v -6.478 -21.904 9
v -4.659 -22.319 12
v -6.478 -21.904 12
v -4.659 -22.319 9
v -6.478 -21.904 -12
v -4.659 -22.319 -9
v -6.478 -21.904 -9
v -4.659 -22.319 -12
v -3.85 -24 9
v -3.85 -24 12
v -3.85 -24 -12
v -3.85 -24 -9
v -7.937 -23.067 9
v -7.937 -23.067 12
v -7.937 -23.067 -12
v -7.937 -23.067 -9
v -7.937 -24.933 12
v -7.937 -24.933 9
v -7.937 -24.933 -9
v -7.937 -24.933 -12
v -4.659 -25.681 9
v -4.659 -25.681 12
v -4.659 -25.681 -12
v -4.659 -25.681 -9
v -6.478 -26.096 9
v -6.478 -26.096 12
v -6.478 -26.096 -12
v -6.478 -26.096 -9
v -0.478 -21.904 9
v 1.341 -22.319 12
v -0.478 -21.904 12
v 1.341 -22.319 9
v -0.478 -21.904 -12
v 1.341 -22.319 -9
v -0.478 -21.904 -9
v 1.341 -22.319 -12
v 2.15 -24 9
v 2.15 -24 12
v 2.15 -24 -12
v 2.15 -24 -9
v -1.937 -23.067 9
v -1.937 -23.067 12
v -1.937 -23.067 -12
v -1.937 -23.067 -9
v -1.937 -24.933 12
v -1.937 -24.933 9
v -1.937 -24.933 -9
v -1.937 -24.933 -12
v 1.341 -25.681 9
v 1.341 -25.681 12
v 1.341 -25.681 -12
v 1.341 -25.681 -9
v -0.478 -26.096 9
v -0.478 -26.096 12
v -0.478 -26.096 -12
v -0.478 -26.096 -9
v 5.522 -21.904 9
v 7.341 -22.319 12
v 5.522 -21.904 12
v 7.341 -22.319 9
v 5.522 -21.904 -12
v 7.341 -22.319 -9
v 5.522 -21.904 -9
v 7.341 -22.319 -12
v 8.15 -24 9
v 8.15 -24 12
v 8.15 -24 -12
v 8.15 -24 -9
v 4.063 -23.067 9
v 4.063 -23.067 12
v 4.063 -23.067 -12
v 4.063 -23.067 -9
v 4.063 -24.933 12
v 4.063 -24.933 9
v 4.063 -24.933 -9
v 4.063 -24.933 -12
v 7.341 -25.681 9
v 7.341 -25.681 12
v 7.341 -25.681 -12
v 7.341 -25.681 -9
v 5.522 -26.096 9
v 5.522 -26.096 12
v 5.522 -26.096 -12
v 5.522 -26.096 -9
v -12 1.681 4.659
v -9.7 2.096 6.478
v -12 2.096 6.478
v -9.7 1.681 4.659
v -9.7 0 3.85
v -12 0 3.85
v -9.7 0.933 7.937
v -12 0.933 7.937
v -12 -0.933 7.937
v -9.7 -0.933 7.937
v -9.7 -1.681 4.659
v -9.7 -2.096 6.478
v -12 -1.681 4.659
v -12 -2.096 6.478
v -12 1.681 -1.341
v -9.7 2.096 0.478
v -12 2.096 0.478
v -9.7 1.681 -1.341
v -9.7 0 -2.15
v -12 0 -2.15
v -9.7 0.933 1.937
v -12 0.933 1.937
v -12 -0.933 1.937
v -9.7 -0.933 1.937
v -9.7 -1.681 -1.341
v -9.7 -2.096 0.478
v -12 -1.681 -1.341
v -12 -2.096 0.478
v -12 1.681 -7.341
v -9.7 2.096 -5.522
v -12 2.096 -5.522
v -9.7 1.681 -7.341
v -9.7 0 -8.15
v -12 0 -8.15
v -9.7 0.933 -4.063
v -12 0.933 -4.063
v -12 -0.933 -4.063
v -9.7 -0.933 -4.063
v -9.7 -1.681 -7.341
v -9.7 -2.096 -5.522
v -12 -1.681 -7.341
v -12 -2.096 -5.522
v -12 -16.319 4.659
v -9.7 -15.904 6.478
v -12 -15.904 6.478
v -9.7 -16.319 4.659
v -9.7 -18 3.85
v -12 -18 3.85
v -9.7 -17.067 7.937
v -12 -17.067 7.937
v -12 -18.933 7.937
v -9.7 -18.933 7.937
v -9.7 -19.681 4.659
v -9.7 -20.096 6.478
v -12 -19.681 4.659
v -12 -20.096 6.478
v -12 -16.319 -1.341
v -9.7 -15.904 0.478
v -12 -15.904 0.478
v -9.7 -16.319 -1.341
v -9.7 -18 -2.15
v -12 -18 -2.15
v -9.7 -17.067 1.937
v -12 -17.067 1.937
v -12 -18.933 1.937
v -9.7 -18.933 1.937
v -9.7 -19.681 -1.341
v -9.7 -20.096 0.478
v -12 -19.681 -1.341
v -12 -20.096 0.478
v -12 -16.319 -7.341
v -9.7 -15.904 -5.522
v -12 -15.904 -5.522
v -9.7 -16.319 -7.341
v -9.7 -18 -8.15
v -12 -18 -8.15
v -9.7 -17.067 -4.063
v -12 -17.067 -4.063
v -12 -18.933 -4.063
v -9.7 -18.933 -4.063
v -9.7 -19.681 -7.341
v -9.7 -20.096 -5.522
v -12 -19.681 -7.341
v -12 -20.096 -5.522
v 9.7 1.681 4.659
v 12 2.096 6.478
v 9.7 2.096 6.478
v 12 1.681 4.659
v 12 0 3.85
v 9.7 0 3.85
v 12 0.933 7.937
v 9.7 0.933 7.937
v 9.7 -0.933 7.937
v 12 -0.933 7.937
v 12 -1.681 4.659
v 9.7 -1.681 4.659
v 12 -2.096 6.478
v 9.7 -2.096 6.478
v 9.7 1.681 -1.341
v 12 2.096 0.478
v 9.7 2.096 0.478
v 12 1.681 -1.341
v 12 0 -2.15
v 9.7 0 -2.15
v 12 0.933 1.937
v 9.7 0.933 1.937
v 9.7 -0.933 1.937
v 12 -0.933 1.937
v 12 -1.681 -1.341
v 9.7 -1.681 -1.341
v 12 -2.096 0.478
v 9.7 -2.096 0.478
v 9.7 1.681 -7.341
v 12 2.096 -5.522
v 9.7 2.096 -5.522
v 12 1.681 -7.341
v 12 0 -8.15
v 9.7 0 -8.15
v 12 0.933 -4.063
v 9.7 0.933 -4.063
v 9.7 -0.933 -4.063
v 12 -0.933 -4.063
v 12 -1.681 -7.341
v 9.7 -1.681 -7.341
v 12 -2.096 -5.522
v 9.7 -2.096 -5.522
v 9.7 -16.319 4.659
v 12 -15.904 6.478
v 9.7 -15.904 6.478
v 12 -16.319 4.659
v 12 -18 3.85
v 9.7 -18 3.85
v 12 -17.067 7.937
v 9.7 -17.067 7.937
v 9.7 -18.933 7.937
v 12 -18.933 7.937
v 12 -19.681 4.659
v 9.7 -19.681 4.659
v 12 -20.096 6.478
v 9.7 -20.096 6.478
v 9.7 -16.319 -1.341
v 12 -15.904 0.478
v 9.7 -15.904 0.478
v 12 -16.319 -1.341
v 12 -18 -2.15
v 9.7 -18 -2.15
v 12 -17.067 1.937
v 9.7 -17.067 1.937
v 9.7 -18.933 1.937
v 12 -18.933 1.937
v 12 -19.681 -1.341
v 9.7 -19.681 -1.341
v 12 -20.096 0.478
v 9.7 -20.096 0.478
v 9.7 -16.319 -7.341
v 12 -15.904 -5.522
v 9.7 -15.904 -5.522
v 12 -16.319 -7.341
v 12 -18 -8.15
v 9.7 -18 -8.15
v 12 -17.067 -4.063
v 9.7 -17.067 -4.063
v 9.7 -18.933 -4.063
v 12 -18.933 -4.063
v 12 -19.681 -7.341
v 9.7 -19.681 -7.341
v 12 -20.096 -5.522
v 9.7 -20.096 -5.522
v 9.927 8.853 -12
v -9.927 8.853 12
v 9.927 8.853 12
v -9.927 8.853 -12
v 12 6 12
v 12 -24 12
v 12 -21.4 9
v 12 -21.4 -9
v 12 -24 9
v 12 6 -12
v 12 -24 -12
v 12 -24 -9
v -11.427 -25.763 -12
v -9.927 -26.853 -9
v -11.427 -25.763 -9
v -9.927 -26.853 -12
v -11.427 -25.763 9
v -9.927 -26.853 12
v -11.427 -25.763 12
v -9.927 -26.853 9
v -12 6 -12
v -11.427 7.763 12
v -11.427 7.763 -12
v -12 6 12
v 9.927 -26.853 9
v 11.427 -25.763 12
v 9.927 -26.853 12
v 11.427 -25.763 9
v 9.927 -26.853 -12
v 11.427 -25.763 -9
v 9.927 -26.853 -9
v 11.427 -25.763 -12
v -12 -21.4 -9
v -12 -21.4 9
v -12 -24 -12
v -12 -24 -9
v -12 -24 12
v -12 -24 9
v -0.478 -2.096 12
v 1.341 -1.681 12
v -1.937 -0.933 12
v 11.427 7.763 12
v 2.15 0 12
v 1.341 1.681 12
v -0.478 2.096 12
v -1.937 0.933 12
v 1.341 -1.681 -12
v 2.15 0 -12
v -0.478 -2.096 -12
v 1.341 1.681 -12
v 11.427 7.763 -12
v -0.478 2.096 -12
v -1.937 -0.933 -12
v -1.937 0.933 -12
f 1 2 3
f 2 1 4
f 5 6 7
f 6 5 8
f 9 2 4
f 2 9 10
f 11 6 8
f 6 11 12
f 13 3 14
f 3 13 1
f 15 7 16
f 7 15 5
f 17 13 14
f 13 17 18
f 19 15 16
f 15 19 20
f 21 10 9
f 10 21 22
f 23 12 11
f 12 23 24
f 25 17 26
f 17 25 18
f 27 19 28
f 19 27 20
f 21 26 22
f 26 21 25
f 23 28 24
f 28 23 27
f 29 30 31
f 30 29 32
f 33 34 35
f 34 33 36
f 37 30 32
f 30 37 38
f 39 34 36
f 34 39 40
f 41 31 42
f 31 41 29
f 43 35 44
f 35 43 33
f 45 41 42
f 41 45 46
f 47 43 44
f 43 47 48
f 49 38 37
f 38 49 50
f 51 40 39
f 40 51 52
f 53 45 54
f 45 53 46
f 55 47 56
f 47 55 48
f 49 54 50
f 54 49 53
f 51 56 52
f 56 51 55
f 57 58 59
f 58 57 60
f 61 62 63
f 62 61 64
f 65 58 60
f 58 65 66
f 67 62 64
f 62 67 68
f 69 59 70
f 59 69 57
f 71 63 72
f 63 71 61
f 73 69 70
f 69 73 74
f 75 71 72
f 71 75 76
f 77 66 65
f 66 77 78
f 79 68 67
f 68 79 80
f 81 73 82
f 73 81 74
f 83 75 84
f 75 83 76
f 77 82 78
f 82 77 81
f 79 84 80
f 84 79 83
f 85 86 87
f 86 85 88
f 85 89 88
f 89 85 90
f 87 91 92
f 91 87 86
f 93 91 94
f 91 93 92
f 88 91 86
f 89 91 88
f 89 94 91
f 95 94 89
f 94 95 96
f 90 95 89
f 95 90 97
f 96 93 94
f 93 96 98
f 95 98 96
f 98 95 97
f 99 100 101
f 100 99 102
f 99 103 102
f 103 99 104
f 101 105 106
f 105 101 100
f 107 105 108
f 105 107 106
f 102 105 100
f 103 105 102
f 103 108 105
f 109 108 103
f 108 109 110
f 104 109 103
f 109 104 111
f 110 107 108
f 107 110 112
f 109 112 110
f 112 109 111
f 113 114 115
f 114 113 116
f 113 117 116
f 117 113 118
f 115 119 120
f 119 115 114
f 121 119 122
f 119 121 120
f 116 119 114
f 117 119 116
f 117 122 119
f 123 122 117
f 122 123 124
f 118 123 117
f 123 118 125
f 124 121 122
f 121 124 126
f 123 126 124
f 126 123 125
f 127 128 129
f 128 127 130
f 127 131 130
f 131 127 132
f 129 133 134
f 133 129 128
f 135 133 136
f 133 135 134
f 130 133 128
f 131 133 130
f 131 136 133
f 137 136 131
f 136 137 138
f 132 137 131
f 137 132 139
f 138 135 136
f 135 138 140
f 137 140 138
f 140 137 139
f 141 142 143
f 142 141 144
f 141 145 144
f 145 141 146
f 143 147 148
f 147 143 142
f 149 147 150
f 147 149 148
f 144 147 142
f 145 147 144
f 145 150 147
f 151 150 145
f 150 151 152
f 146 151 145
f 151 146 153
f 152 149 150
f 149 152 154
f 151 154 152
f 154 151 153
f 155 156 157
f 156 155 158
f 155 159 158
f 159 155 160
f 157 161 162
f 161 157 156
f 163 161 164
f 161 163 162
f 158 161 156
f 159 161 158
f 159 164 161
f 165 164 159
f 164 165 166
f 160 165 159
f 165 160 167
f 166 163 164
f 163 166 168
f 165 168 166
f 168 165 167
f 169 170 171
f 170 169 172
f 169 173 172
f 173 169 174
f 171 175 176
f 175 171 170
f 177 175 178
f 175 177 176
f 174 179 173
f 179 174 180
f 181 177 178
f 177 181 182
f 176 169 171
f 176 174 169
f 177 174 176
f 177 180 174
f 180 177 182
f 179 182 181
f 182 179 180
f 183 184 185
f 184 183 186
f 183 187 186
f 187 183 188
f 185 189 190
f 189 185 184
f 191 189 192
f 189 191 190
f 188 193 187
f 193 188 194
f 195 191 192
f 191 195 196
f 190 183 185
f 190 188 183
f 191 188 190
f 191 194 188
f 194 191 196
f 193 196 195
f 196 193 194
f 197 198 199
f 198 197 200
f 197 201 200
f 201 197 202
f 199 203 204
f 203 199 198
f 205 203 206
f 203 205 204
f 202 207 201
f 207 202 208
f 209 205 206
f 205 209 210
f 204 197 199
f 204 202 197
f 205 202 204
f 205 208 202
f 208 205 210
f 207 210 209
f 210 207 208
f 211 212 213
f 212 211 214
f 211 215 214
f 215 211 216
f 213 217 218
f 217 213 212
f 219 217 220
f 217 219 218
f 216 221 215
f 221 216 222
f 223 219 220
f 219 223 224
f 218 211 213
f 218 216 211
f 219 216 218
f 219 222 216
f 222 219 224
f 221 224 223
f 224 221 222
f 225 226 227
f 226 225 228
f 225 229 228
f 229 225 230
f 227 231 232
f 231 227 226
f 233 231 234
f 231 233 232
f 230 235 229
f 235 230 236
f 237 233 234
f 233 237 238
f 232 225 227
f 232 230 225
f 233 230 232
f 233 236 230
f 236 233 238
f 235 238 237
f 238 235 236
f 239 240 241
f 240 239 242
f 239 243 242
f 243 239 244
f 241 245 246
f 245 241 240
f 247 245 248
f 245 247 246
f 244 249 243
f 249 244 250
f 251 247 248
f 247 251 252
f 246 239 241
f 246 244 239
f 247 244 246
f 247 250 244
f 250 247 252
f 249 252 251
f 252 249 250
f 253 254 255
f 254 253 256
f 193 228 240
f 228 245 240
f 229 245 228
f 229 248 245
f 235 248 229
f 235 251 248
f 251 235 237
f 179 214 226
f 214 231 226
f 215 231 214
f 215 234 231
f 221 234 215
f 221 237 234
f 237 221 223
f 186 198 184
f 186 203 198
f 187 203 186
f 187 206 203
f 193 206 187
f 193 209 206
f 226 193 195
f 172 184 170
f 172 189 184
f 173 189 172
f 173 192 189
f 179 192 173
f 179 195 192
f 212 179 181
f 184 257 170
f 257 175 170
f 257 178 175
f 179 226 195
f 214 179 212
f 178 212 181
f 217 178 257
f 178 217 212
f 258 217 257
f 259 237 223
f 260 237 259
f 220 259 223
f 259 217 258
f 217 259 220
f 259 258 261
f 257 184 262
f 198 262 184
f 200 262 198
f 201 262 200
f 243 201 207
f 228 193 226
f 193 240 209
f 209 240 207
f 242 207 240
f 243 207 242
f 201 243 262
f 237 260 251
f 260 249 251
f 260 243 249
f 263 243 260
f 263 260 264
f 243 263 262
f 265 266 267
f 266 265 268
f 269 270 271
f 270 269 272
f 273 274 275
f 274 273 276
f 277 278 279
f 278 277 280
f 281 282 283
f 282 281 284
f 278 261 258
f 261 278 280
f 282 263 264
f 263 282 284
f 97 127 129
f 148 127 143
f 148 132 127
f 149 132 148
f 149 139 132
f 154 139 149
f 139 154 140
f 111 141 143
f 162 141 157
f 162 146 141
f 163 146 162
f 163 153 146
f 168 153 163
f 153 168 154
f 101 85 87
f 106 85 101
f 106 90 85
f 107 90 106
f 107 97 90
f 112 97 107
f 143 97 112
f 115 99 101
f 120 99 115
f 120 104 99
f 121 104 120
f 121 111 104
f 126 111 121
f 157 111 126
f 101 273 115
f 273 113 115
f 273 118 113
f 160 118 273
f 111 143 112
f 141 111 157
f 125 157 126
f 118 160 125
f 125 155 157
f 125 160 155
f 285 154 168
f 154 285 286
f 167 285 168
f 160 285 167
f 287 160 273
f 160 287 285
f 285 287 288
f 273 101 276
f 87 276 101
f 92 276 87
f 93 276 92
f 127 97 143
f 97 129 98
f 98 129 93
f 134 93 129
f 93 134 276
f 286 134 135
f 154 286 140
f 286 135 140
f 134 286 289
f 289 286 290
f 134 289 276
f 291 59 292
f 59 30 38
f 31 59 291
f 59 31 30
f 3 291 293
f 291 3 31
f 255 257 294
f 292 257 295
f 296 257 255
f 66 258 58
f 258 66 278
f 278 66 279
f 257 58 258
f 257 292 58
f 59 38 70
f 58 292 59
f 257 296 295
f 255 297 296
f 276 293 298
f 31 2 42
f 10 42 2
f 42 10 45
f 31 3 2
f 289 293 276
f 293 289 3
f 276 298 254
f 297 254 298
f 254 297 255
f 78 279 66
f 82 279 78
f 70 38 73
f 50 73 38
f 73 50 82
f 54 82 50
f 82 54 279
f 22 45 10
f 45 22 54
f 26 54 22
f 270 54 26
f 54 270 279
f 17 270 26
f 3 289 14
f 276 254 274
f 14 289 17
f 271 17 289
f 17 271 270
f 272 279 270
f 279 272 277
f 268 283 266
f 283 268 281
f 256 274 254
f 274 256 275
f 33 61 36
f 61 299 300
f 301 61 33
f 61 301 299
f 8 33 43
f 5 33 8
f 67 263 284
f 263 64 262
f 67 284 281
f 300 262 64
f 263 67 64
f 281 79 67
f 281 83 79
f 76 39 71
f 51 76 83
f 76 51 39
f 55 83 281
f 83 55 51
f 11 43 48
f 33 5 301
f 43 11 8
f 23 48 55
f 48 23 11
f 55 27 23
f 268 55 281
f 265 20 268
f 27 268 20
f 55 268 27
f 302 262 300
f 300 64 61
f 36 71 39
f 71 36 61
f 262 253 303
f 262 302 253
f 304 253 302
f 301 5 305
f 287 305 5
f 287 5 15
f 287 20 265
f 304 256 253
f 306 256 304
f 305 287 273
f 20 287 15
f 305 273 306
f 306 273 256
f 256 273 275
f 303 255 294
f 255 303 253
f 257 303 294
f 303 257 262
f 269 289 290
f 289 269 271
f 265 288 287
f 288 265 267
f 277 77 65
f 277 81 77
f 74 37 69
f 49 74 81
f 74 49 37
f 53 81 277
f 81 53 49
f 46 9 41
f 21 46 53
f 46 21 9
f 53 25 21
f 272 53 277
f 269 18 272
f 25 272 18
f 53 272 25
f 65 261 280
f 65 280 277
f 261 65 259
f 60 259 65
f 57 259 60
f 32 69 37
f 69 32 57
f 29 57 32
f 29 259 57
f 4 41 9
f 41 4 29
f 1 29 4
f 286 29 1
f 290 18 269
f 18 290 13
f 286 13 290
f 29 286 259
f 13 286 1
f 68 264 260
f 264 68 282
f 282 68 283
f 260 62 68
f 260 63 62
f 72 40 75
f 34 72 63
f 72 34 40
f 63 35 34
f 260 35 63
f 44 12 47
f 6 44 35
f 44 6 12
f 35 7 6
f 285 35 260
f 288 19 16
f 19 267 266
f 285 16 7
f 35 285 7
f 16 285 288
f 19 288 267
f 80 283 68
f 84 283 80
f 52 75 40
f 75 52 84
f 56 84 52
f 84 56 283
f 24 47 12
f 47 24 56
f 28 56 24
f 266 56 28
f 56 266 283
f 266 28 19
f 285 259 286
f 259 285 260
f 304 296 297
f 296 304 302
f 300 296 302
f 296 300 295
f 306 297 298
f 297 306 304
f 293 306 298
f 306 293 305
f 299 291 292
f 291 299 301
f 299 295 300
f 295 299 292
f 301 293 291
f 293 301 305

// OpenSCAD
// file: ../util/rounded.scad
// Do a rounded cube
module rounded(x=10, y=10, z=10, r=3, center=false) {
  if (center) {
    translate([-(x/2),-(y/2),0])
      rounded(x, y, z, r);
  } else {
    translate([r,r,0])
    minkowski() {
      cube([x-2*r,y-2*r,z/2]);
      cylinder(h=z/2, r=r);
    }
  }
}
// file: ollo.scad
// Diameter of plastic ollo holes
OlloHoles = 4.3;

// Width of Ollo "real" plastic
OlloWidth = 3;

// Distance between two ollo holes
OlloSpacing = 6;

// Do an Ollo hole on the part
module olloHole(depth=2.2)
{
    translate([0,0,-0.1])
      cylinder(depth+0.2, OlloHoles/2, OlloHoles/2);
}

// Do 3 ollo holes
module threeOllo(depth=2.2)
{
  for (xy=[[-OlloSpacing,0],[0,0],[OlloSpacing,0]]) {
    translate([xy[0], xy[1], 0])
    olloHole(depth);
  }
}

// Do a servo arm holes
module servoArm(depth=2.2)
{
    threeOllo(depth);
    rotate([0,0,90])
    threeOllo(depth);
}
// main file
include <ollo.scad>;
use <../util/rounded.scad>;

// Motor dimensions
MotorWidth = 24; 
MotorHeight = 36; 
MotorDepth = 24; 
MotorArmOffset = 9;

module motor(width=2.2) {
    translate([0,-MotorArmOffset,-MotorDepth/2]) {
        color([0.25,0.25,0.25]) {
	          difference() {
  	            rounded(MotorWidth,MotorHeight,MotorDepth,3,center=true);
                
		            // Bottom
                translate([-MotorWidth/2-0.1,-MotorHeight/2-0.1,3]){
	                  cube([MotorWidth+0.2, 5.7, MotorDepth-6]);
                }
                
		            translate([0,-MotorHeight/2+3]){
		                threeOllo(MotorDepth);
                }
                
		            // Motor shaft
	              translate([0, MotorArmOffset]){
     	              olloHole(MotorDepth+5);
                }
                
		            // Side holes
		            for (side=[-MotorWidth/2,MotorWidth/2-width]) {
		                translate([side,9,MotorDepth/2]) {
		                    rotate([0,90,0]) {
		                        threeOllo();
			                      translate([0,-3*OlloSpacing,0])
			                      threeOllo();
		                    }
		                }
		            }
	          }
        }
	  }
}

motor();
